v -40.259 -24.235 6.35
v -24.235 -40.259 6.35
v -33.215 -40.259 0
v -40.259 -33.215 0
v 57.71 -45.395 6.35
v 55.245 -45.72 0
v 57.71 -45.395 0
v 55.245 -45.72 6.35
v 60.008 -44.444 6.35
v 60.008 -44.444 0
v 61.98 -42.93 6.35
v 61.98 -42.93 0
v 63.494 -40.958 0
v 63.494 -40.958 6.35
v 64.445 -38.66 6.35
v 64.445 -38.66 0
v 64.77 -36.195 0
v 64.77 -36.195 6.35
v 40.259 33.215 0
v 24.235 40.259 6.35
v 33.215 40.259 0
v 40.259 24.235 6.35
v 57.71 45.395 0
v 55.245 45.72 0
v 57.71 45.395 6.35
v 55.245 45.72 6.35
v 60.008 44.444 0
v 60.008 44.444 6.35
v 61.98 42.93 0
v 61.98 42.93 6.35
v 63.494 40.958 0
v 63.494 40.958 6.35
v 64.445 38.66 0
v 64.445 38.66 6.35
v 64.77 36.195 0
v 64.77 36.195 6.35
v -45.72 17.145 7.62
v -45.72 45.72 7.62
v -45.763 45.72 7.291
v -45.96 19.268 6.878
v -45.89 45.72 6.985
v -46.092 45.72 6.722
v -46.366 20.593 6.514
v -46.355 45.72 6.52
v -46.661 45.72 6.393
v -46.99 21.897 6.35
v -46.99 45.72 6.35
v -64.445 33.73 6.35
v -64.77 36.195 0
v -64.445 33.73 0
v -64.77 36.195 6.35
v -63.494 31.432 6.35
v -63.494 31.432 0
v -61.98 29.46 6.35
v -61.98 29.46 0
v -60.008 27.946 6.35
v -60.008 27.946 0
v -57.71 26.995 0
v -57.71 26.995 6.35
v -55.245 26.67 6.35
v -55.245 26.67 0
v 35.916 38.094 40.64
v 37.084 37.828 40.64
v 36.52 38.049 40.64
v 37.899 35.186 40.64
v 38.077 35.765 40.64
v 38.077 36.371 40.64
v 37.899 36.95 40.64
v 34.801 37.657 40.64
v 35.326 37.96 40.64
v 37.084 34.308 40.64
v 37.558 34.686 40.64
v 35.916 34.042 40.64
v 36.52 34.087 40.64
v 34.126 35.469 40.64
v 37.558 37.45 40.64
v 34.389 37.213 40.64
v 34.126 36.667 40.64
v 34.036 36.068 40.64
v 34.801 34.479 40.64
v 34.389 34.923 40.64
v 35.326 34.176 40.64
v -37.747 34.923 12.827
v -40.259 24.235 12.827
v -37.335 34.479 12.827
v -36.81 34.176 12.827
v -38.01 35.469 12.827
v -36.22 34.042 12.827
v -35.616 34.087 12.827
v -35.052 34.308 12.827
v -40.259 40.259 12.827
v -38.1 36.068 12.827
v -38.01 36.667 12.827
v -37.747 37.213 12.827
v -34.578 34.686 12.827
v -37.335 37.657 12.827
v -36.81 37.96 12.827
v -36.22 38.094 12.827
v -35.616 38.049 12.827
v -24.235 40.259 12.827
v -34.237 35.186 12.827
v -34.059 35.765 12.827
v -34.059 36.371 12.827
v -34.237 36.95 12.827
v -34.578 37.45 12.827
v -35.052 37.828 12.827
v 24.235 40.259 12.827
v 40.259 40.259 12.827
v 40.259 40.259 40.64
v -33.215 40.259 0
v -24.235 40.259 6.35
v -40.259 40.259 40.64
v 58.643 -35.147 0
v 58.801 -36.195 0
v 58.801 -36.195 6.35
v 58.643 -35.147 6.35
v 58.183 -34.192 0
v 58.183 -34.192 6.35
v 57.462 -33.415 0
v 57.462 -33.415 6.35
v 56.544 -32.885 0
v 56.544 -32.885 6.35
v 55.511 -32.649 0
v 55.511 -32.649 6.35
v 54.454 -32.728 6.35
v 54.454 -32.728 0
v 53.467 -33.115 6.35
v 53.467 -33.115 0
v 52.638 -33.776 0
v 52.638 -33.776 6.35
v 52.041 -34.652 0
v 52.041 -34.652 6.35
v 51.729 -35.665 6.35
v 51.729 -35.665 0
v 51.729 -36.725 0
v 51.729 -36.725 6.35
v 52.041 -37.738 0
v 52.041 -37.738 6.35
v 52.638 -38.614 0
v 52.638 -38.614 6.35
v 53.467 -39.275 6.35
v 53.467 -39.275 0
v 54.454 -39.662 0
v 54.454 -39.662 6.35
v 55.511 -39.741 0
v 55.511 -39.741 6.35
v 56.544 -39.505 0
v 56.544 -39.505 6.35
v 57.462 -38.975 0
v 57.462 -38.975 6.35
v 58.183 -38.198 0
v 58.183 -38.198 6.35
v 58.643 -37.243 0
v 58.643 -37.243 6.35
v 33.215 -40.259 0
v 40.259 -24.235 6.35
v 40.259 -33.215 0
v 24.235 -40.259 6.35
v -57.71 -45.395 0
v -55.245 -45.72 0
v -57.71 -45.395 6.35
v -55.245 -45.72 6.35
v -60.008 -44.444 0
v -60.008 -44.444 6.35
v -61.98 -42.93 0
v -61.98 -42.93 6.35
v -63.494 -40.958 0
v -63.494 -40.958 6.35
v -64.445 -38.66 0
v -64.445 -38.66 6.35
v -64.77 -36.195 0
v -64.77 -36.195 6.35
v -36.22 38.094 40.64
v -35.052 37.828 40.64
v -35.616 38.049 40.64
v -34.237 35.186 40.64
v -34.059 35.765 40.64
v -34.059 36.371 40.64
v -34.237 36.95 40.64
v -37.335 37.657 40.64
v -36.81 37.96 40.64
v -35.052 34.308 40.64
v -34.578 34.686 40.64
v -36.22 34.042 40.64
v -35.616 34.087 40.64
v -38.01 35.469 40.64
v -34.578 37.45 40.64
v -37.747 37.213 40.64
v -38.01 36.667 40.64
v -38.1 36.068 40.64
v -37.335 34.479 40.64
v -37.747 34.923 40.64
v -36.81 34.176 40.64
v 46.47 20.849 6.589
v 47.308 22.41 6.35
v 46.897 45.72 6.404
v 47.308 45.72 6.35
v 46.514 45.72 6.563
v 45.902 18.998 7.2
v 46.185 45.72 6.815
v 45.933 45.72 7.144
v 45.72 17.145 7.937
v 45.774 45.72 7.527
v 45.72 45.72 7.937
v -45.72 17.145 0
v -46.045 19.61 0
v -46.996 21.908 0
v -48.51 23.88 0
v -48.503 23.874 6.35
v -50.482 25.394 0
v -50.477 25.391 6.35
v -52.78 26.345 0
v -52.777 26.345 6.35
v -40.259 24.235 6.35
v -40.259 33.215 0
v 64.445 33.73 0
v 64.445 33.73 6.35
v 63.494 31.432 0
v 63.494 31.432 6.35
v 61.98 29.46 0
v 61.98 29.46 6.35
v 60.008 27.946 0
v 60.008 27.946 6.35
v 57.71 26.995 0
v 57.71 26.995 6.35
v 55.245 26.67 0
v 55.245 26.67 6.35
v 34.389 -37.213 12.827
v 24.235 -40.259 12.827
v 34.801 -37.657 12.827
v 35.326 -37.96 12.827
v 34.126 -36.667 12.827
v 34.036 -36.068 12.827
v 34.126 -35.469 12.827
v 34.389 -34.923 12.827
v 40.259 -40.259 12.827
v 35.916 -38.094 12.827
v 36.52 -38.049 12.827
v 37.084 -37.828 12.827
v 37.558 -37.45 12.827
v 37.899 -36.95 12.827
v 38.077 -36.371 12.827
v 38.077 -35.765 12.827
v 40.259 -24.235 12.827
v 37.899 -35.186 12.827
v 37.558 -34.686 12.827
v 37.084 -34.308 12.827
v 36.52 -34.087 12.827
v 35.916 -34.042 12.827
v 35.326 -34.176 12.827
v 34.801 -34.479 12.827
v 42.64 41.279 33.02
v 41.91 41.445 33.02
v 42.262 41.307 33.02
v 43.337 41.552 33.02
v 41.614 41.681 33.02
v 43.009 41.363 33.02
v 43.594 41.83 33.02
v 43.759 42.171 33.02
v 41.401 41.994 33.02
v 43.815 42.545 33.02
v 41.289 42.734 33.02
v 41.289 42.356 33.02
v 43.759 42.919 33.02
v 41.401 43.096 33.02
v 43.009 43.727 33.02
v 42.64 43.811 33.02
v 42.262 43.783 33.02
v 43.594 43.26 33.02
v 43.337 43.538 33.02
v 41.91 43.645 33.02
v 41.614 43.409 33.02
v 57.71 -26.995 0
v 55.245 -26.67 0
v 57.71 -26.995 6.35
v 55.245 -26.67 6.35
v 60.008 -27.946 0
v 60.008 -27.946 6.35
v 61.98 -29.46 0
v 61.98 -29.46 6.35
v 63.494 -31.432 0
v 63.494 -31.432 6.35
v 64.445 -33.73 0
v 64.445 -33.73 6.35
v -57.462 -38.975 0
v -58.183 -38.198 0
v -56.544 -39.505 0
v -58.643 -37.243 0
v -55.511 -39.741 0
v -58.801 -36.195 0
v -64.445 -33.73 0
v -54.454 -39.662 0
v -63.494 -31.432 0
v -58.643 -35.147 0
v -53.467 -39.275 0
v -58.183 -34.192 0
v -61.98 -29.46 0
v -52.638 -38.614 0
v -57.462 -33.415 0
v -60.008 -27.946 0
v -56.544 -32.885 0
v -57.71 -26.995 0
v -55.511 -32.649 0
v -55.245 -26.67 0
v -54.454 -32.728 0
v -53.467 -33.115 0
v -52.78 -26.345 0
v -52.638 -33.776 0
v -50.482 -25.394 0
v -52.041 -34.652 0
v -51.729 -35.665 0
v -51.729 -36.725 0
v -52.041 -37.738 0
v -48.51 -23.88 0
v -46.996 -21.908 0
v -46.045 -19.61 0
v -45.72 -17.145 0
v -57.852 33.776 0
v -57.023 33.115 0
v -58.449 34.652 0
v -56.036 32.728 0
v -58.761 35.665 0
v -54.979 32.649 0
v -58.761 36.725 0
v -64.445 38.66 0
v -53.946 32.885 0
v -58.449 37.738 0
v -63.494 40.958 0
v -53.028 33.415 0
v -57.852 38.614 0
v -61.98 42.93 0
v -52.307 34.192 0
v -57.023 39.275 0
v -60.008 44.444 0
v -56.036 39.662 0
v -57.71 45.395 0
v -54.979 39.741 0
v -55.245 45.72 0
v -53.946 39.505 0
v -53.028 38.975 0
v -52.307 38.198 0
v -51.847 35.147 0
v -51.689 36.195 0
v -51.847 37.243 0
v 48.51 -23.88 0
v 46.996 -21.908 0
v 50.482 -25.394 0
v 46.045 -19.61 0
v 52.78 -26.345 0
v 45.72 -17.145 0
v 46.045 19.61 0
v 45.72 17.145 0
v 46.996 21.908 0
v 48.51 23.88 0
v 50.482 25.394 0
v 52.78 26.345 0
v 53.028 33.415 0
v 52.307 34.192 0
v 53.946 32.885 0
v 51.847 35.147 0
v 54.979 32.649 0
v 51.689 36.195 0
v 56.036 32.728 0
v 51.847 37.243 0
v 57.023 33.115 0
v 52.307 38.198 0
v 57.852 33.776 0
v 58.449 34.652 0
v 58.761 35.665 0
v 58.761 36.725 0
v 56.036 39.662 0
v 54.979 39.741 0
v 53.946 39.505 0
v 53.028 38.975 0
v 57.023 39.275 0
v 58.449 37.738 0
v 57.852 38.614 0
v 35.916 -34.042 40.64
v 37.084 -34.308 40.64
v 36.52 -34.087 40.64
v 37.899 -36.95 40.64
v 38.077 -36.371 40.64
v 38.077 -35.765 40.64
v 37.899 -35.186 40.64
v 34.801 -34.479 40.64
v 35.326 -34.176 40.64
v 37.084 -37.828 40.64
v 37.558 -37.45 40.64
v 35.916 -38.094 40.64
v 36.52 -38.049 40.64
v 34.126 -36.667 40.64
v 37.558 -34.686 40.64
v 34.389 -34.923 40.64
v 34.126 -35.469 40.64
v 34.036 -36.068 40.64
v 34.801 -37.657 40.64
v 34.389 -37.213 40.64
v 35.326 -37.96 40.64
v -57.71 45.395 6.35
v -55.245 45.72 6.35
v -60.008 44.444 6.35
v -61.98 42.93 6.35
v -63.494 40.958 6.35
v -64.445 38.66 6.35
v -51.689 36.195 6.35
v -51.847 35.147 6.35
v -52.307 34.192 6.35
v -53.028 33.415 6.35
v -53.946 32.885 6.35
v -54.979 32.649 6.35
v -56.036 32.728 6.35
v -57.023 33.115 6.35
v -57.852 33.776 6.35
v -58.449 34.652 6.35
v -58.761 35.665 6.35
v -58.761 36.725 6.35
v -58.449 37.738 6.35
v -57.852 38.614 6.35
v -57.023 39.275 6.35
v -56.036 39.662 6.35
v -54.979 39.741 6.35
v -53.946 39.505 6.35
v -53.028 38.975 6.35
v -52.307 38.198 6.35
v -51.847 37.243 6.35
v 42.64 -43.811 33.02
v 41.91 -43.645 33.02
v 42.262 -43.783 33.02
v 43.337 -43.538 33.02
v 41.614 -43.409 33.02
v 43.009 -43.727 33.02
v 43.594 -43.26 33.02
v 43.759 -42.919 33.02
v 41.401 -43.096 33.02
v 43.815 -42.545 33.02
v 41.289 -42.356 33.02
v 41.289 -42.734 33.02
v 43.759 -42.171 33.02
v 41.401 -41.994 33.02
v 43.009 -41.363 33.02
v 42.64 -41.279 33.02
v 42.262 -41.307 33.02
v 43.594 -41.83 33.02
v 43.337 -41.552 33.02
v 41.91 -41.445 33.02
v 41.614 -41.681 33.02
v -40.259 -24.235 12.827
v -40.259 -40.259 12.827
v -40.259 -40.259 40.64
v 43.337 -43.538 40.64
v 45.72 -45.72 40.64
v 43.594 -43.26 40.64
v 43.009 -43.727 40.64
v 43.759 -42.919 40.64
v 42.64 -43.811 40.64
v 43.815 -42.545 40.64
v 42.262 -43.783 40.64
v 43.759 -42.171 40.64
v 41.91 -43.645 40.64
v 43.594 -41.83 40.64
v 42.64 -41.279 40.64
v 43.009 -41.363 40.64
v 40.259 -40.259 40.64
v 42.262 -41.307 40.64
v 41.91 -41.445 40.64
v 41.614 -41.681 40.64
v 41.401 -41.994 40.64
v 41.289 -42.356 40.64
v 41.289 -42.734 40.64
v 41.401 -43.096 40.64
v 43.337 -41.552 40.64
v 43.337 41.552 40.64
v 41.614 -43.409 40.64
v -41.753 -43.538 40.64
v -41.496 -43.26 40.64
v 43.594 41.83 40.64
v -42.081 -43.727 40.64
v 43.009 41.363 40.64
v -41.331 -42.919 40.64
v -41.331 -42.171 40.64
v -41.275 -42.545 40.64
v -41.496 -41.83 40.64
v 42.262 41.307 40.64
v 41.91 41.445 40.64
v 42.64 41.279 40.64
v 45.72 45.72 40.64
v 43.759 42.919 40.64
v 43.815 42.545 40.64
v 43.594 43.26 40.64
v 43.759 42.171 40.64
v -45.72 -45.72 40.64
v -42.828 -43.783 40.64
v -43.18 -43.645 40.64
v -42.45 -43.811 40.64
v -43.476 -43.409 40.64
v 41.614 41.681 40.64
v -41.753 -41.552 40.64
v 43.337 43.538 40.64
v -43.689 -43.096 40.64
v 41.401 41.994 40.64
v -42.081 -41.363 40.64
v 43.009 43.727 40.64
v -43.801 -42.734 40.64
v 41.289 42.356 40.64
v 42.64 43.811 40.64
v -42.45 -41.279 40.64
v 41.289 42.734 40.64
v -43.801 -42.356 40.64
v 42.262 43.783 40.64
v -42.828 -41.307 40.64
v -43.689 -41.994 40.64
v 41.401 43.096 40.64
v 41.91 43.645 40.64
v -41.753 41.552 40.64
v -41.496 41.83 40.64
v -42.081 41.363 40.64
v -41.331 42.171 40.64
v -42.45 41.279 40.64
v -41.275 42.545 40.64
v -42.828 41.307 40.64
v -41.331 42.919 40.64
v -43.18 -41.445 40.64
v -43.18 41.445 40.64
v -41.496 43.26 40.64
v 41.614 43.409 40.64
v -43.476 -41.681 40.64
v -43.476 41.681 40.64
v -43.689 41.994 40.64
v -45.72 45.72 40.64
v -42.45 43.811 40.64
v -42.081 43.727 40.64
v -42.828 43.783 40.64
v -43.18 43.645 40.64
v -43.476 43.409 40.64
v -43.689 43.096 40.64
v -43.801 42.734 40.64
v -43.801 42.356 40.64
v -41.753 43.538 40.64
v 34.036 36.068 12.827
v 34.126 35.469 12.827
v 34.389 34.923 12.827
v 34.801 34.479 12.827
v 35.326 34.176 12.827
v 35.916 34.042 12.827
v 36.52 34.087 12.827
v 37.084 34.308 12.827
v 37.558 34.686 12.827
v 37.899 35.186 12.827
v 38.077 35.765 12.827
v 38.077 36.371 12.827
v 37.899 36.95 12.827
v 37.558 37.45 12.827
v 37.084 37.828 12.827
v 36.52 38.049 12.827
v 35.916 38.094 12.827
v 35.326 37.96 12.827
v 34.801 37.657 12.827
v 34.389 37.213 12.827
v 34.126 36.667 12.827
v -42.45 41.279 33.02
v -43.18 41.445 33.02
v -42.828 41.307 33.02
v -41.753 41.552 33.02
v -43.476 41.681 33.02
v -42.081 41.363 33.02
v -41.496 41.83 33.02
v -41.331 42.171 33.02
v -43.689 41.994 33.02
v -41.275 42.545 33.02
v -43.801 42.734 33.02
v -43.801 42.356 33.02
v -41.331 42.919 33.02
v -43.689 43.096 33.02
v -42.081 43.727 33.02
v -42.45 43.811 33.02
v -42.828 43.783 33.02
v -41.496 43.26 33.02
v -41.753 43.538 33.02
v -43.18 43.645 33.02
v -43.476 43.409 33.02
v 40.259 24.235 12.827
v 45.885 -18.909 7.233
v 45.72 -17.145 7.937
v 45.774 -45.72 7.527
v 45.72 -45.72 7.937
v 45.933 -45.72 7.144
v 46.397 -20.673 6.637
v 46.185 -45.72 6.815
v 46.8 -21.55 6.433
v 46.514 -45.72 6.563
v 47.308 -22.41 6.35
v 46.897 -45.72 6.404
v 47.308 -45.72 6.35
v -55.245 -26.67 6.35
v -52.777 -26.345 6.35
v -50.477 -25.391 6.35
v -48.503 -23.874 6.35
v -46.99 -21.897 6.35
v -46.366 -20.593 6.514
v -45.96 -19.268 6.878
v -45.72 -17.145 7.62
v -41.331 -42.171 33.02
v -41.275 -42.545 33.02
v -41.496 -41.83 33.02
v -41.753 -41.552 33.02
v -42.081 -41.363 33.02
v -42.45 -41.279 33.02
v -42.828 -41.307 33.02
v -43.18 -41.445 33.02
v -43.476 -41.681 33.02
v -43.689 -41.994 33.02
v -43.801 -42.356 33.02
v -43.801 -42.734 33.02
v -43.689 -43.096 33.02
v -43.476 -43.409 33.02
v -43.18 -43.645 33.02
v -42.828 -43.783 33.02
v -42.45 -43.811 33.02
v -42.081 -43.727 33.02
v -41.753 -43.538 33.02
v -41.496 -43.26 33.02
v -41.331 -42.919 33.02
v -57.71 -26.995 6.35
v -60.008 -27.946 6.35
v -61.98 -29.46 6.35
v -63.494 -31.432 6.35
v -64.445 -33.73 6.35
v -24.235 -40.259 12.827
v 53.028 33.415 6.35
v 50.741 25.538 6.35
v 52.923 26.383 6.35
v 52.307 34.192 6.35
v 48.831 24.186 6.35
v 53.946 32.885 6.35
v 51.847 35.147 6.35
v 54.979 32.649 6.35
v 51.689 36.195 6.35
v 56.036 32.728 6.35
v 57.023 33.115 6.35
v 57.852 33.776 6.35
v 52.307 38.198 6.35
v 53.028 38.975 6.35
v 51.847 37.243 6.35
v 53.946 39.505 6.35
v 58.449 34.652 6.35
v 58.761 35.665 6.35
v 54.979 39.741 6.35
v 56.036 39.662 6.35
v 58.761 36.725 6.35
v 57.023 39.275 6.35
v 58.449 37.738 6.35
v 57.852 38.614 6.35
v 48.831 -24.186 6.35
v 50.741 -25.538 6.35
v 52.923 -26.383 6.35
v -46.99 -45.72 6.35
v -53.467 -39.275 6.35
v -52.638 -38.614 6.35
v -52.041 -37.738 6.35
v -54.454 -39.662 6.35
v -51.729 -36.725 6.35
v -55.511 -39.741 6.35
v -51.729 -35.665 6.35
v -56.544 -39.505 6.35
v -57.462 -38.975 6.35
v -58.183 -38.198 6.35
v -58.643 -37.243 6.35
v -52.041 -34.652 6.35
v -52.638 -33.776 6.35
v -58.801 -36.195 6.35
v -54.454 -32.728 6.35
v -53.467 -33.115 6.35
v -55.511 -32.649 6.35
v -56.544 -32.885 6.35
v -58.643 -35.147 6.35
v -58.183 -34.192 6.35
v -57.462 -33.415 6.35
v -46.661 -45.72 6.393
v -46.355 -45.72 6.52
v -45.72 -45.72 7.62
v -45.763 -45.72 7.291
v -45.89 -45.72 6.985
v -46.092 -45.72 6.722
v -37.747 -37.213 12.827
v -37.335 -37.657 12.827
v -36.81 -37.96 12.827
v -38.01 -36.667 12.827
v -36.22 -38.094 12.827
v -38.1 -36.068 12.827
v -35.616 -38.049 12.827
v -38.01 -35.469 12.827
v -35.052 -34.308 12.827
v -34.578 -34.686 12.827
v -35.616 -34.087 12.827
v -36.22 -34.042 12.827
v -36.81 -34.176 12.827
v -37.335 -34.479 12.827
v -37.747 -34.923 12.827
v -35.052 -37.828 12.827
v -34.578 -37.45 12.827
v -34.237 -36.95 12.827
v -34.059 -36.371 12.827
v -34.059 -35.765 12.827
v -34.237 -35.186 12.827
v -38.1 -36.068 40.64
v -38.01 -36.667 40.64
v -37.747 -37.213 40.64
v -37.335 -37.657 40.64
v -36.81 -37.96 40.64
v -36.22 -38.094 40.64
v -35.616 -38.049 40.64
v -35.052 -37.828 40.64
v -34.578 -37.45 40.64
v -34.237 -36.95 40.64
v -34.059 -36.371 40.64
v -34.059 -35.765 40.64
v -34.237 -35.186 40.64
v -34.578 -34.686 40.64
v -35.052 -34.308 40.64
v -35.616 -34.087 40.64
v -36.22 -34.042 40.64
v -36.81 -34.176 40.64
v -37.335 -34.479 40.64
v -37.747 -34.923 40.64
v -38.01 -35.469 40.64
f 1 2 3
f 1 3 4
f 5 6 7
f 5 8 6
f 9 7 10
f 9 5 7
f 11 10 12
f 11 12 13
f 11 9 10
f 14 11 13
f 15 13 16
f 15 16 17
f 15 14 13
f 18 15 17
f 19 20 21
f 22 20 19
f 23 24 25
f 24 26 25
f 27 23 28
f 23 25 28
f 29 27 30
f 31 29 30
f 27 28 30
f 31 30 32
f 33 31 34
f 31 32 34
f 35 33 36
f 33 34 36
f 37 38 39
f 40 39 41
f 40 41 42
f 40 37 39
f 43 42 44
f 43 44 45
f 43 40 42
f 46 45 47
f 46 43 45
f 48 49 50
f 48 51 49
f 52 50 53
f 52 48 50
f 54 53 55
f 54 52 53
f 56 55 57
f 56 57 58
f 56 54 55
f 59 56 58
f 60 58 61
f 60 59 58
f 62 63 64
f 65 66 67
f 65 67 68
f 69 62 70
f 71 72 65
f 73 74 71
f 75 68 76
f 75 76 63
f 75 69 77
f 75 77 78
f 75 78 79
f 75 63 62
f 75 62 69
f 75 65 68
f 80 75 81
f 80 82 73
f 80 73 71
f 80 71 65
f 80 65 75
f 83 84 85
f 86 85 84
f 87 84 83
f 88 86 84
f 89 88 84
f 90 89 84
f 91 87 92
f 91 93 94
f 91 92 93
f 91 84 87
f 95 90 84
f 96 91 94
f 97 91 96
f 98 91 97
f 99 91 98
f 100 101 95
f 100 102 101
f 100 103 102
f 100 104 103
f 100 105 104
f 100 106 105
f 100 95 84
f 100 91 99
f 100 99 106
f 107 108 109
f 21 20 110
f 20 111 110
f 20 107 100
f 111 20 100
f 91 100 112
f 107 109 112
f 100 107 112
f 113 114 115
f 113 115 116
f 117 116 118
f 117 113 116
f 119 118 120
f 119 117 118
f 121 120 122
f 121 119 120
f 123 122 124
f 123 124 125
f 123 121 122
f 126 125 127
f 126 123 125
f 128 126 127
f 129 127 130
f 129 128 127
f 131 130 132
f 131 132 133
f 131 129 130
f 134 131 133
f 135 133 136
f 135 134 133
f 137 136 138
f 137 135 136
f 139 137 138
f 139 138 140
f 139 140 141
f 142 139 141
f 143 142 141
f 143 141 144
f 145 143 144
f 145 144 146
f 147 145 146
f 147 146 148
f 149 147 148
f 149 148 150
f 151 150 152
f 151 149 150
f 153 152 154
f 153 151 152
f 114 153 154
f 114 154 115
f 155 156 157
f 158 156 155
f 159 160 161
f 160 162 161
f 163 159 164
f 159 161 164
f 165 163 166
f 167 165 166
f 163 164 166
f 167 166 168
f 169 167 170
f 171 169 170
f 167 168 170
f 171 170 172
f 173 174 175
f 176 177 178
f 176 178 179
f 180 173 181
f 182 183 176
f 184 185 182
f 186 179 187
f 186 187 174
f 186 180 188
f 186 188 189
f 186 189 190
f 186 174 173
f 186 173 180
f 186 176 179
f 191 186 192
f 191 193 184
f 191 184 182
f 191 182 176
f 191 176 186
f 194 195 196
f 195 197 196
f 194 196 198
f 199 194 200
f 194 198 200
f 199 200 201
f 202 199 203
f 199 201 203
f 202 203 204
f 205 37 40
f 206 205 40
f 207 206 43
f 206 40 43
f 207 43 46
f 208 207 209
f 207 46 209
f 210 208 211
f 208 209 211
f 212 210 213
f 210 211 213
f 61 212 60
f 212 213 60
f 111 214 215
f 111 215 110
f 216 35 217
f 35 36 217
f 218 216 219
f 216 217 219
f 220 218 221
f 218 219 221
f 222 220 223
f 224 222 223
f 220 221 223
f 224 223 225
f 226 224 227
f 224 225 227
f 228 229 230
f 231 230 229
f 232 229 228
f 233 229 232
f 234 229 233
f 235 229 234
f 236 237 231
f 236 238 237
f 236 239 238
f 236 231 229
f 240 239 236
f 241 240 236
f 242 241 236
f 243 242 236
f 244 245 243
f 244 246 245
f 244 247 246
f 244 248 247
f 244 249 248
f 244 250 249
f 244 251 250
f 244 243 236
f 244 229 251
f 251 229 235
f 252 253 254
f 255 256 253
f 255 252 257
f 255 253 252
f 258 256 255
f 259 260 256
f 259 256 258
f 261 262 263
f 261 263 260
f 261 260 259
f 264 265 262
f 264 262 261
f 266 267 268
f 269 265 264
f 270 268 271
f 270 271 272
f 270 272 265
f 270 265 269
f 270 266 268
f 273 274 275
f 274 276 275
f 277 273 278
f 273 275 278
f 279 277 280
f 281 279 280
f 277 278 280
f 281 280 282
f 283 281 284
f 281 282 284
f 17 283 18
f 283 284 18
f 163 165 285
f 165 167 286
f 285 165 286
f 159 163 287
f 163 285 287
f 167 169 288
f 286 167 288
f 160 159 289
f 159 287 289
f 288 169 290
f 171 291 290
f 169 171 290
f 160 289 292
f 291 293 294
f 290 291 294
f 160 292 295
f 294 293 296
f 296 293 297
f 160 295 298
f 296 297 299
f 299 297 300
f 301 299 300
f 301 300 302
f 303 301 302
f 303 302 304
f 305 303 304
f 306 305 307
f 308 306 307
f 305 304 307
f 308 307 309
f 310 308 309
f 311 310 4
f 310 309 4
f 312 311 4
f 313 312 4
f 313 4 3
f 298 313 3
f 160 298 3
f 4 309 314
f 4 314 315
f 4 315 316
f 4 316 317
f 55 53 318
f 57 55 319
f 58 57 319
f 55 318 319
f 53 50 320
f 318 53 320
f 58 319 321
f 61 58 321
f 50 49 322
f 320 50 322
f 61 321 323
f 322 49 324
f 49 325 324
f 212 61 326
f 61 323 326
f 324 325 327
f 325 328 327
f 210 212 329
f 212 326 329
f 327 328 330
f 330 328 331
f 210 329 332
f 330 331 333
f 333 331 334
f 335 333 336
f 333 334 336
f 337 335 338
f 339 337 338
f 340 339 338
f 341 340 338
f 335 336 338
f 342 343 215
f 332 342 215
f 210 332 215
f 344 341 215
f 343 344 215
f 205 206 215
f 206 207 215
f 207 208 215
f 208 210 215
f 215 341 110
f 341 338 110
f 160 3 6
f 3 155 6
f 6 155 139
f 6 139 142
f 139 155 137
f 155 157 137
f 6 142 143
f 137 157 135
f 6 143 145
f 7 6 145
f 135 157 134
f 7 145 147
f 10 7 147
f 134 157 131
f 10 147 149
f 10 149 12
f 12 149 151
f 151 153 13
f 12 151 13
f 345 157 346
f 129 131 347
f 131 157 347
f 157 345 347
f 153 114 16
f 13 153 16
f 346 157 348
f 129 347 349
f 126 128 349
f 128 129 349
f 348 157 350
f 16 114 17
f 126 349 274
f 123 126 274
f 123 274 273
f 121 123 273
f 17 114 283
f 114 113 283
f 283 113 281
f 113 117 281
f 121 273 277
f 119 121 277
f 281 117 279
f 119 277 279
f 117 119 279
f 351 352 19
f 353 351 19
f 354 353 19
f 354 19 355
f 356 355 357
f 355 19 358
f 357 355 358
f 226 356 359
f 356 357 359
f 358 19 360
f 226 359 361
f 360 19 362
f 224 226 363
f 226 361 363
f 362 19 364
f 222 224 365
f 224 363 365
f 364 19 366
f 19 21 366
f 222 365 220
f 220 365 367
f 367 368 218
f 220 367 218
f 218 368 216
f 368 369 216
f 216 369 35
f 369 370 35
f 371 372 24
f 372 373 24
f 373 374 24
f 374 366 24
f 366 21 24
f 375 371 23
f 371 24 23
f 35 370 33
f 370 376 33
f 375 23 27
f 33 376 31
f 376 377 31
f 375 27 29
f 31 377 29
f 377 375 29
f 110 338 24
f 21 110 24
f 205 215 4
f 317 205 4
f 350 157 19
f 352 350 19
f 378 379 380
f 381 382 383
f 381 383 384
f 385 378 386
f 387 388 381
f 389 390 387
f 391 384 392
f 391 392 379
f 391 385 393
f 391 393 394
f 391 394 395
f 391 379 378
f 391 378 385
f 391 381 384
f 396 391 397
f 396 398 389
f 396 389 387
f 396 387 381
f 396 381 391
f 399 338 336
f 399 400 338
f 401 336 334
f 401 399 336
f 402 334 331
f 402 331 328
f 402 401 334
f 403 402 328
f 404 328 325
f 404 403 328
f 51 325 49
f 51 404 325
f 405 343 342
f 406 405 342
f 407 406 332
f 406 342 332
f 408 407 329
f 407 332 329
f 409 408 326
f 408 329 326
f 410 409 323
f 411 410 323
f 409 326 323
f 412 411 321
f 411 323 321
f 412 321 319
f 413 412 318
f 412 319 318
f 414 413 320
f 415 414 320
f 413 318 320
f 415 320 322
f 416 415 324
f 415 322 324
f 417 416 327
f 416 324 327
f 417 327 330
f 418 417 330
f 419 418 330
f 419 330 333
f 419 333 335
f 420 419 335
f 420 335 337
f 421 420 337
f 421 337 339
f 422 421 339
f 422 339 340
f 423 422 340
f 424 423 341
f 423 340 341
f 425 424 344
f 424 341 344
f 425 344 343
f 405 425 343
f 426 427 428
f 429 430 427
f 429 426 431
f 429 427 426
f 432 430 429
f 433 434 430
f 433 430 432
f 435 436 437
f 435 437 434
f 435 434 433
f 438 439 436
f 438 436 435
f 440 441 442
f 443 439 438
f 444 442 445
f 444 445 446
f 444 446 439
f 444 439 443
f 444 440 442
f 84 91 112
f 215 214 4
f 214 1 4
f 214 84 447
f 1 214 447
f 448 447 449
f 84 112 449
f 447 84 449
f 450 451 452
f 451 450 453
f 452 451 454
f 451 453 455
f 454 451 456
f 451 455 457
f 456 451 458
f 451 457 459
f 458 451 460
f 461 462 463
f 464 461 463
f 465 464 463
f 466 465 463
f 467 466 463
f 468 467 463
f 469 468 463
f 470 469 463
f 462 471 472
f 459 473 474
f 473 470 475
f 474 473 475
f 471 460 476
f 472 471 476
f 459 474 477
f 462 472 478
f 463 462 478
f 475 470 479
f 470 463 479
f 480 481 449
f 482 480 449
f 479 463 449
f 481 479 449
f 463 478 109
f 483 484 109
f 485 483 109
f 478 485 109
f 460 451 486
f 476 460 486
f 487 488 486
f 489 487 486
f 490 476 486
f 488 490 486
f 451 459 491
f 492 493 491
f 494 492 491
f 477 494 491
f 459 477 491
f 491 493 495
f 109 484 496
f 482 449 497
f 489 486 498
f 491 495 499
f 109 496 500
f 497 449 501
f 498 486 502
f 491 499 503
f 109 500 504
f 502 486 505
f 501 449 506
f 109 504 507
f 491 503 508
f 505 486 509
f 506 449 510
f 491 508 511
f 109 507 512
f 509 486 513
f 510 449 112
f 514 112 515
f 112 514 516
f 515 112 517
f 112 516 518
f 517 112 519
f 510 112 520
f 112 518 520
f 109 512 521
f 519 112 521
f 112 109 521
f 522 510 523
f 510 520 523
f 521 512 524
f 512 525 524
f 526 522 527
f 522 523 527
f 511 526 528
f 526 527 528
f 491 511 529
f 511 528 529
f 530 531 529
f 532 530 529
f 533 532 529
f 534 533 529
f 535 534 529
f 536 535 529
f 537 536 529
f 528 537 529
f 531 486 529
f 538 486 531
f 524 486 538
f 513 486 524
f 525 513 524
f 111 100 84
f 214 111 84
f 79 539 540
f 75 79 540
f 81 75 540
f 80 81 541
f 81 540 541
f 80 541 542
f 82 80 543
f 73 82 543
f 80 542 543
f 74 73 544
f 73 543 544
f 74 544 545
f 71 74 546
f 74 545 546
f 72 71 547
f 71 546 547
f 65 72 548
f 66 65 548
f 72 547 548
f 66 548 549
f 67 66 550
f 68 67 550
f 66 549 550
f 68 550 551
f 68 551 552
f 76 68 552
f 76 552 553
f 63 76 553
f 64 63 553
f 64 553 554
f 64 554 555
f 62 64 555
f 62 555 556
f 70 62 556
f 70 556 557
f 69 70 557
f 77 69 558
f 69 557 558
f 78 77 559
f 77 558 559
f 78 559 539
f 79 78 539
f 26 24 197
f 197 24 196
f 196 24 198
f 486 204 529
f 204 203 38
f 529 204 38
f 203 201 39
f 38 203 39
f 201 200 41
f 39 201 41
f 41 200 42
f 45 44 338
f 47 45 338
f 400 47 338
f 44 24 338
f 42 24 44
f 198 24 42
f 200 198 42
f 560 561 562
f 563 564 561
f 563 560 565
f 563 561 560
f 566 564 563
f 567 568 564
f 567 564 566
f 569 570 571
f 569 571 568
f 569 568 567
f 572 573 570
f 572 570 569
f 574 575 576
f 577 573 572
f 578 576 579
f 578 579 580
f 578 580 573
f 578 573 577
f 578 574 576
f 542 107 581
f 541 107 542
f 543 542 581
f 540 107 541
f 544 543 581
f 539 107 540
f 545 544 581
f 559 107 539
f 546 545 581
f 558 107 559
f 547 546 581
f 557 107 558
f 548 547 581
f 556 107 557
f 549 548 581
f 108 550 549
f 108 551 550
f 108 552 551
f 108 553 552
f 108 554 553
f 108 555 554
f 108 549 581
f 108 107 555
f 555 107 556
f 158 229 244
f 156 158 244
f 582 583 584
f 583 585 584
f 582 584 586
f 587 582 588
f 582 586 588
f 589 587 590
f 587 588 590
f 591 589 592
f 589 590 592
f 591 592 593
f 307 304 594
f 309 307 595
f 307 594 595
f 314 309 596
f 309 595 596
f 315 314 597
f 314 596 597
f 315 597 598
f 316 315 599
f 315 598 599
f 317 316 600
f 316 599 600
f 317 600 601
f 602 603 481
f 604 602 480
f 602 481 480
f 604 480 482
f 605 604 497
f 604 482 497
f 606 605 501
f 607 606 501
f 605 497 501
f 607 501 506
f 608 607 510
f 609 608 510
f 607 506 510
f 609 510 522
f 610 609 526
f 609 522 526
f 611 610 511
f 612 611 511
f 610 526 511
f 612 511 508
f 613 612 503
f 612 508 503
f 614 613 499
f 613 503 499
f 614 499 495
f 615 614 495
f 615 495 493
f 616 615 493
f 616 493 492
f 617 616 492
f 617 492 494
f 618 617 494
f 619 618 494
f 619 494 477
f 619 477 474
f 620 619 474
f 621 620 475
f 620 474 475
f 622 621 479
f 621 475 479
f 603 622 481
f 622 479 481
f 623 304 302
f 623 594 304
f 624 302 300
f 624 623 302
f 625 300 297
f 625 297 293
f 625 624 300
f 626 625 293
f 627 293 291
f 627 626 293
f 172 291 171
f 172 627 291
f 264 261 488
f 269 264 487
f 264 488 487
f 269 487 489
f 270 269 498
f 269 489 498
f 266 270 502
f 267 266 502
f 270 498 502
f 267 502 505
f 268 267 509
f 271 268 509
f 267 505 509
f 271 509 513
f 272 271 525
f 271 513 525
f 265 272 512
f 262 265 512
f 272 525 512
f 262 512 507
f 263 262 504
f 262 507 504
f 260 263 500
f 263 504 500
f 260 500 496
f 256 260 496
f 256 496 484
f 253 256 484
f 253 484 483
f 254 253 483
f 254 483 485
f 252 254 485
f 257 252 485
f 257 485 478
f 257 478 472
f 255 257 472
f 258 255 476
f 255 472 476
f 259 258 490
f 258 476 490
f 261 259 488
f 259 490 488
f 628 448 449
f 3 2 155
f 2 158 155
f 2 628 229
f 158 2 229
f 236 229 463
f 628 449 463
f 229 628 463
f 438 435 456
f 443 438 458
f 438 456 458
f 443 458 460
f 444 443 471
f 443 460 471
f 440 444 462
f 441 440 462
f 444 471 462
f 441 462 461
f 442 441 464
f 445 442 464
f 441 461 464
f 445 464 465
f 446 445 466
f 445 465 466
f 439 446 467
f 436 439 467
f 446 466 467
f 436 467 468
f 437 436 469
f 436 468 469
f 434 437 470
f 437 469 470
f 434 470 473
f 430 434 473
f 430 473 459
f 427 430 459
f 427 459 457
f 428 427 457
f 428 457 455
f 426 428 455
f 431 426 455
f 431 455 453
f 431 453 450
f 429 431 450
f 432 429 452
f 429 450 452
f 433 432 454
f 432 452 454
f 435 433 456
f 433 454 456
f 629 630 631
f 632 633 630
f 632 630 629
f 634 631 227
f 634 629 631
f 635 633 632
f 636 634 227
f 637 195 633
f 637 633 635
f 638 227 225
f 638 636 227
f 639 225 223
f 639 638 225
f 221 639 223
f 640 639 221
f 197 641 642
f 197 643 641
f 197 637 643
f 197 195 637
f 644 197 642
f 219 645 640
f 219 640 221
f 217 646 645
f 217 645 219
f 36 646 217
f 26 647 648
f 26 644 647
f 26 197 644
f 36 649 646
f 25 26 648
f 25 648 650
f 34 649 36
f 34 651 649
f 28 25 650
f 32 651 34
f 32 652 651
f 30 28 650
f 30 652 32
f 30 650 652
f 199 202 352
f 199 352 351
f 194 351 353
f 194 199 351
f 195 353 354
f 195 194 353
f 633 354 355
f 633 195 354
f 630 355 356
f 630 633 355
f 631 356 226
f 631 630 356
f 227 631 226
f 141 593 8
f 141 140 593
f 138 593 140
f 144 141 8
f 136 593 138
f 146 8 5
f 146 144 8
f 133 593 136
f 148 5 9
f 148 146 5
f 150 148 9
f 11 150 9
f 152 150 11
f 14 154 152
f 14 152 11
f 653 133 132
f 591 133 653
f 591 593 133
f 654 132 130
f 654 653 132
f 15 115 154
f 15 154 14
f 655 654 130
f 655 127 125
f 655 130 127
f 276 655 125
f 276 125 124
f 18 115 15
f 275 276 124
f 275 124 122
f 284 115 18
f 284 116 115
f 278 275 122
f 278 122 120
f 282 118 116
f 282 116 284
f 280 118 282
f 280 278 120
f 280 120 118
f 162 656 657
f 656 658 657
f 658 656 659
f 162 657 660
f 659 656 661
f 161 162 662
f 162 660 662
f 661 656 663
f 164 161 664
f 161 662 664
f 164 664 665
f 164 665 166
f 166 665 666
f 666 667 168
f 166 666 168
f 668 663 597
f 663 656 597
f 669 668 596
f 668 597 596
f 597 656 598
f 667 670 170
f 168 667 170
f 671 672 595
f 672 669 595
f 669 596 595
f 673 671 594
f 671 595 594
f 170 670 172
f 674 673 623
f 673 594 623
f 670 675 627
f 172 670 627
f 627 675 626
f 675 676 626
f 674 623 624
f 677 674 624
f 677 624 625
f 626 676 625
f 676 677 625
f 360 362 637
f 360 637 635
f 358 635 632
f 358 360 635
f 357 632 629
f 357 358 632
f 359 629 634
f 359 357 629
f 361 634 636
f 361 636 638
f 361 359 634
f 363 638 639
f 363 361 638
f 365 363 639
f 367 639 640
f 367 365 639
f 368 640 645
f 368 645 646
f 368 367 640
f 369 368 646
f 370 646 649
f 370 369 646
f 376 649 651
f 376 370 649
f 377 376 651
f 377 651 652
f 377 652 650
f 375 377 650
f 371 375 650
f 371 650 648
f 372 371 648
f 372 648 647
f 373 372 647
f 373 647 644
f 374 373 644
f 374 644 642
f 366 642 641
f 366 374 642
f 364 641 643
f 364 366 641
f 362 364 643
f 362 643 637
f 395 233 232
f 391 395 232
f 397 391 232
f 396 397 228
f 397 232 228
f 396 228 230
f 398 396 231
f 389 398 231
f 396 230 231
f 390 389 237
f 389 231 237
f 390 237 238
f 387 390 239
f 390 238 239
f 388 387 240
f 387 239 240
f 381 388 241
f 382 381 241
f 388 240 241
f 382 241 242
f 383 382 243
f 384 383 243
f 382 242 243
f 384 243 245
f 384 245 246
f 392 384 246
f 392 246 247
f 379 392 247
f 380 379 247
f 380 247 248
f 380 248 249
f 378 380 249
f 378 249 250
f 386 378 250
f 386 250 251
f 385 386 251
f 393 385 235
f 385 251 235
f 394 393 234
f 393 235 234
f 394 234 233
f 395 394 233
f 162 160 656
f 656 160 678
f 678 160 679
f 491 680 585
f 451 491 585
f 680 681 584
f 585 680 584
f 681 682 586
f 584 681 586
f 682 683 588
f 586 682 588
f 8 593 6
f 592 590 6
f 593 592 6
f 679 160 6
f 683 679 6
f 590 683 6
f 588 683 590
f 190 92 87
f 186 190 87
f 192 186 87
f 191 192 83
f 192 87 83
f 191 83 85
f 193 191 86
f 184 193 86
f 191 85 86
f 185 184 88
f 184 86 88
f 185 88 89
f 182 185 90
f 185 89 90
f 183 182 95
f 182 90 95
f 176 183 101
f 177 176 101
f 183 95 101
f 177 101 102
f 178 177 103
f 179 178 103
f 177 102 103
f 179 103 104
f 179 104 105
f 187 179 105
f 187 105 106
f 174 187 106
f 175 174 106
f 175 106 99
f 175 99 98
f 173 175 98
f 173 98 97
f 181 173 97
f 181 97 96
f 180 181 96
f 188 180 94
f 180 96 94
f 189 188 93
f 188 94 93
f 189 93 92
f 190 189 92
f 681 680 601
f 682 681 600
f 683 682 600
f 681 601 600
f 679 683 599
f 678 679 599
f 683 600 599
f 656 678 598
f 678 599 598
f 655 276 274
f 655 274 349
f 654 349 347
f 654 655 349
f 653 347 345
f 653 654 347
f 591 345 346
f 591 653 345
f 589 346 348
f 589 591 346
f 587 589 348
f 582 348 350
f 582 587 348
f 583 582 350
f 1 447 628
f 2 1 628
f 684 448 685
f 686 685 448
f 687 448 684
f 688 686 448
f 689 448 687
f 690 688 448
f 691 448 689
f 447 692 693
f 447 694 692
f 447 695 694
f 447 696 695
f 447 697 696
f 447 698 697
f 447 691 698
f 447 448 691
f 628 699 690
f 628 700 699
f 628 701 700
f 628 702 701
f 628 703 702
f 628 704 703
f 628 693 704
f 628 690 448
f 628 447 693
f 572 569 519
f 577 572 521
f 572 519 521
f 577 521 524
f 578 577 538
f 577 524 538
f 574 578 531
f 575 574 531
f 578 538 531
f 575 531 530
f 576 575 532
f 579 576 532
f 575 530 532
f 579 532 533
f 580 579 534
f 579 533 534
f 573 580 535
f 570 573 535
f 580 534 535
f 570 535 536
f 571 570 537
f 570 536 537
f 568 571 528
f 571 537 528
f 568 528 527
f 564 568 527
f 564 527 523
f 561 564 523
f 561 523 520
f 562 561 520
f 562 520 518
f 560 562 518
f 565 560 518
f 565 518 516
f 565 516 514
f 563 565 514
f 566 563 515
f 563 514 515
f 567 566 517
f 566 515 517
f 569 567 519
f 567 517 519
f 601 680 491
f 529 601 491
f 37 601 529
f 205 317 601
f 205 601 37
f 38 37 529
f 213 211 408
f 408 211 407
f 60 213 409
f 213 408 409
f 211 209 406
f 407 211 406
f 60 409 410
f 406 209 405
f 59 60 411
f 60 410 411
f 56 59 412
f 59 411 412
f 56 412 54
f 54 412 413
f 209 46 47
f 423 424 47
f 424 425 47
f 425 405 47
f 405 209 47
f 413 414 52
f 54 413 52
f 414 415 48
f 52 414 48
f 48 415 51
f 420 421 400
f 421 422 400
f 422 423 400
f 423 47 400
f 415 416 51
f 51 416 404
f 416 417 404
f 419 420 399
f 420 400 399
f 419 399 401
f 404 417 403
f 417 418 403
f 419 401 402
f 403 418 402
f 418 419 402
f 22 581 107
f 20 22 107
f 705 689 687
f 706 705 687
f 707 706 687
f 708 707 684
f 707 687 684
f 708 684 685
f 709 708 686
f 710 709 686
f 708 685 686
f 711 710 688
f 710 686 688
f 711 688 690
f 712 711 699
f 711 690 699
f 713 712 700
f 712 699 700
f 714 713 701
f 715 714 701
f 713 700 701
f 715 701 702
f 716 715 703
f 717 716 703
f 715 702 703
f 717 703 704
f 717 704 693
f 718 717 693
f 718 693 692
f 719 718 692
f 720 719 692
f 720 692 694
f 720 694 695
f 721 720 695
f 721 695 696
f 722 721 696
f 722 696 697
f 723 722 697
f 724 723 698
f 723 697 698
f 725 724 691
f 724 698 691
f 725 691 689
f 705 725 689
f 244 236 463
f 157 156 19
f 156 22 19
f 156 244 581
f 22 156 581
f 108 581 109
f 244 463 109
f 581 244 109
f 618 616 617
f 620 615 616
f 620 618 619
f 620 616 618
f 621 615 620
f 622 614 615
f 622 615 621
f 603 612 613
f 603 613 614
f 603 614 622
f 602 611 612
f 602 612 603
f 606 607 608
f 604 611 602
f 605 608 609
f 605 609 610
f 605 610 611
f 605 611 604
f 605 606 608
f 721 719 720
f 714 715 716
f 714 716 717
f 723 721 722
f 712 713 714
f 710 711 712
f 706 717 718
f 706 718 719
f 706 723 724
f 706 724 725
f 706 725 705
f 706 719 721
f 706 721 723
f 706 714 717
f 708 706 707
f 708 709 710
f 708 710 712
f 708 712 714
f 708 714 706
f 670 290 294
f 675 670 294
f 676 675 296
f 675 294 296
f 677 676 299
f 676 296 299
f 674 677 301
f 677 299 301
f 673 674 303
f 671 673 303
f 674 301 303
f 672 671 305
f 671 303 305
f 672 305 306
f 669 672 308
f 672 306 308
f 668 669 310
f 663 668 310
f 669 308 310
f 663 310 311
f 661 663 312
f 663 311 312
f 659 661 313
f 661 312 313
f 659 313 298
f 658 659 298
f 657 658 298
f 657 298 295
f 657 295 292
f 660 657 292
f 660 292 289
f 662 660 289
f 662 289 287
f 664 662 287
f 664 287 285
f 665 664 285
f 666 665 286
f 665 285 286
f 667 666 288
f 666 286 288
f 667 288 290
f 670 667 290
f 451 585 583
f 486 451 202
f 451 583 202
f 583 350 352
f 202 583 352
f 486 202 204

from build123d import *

# Parameters (mm, degrees)
SKETCH1_W           = 80.01
SKETCH1_H           = 80.01
BOSS_EXTRUDE1_DEPTH = 12.827
SKETCH2_R           = 2.032
BOSS_EXTRUDE2_DEPTH = 27.813
SKETCH3_W           = 91.44
SKETCH3_H           = 91.44
SKETCH3_W_2         = 80.01
SKETCH3_H_2         = 80.01
BOSS_EXTRUDE3_DEPTH = 40.64
CUT_EXTRUDE1_DEPTH  = 71.386076528
SKETCH6_W           = 80.518
SKETCH6_H           = 80.518
SKETCH6_W_2         = 80.01
SKETCH6_H_2         = 80.01
CUT_EXTRUDE2_DEPTH  = 27.813
CUT_EXTRUDE3_DEPTH  = 71.386076528
SKETCH9_W           = 19.05
SKETCH9_H           = 19.05
SKETCH9_R           = 3.556
BOSS_EXTRUDE4_DEPTH = 6.35
FILLET1_R           = 9.525
FILLET2_R           = 1.27
FILLET3_R           = 9.525
FILLET4_R           = 1.5875
SKETCH10_R          = 1.27
CUT_EXTRUDE4_DEPTH  = 7.62
CHAMFER2_SIZE       = 6.35


with BuildPart() as part:
    # Sketch1 → Boss-Extrude1 (new body)
    with BuildSketch(Plane.XY):
        Rectangle(SKETCH1_W, SKETCH1_H)
    extrude(amount=BOSS_EXTRUDE1_DEPTH)

    # Sketch2 → Boss-Extrude2 (add)
    with BuildSketch(Plane.XY.offset(12.827)):
        with Locations(Location((-36.068, 36.068, 0), (0, 0, 180))):
            Circle(SKETCH2_R)
        with Locations(Location((36.068, 36.068, 0), (0, 0, 180))):
            Circle(SKETCH2_R)
        with Locations(Location((36.068, -36.068, 0), (0, 0, 180))):
            Circle(SKETCH2_R)
        with Locations(Location((-36.068, -36.068, 0), (0, 0, 180))):
            Circle(SKETCH2_R)
    extrude(amount=BOSS_EXTRUDE2_DEPTH)

    # Sketch3 → Boss-Extrude3 (add, through all)
    with BuildSketch(Plane(origin=(0, 0, 0), x_dir=(-1, 0, 0), z_dir=(0, 0, -1))):
        Rectangle(SKETCH3_W, SKETCH3_H)
        Rectangle(SKETCH3_W_2, SKETCH3_H_2, mode=Mode.SUBTRACT)
    extrude(amount=-BOSS_EXTRUDE3_DEPTH)

    # Sketch4 → Cut-Extrude1 (cut, through all)
    with BuildSketch(Plane.XY.offset(12.827)):
        Polygon((24.13, 40.005), (40.005, 24.13), (40.005, -24.13), (24.13, -40.005), (-24.13, -40.005), (-40.005, -24.13), (-40.005, 24.13), (-24.13, 40.005), align=None)
    extrude(amount=-CUT_EXTRUDE1_DEPTH, mode=Mode.SUBTRACT)

    # Sketch6 → Cut-Extrude2 (cut)
    with BuildSketch(Plane.XY.offset(40.64)):
        Rectangle(SKETCH6_W, SKETCH6_H)
        Rectangle(SKETCH6_W_2, SKETCH6_H_2, mode=Mode.SUBTRACT)
    extrude(amount=-CUT_EXTRUDE2_DEPTH, mode=Mode.SUBTRACT)

    # Sketch7 → Cut-Extrude3 (cut, through all)
    with BuildSketch(Plane.XY.offset(12.827)):
        Polygon((-40.259, 24.235210245), (-40.259, -24.235210245), (-24.235210245, -40.259), (24.235210245, -40.259), (40.259, -24.235210245), (40.259, 24.235210245), (24.235210245, 40.259), (-24.235210245, 40.259), align=None)
        Polygon((-40.005, 24.13), (-40.005, -24.13), (-24.13, -40.005), (24.13, -40.005), (40.005, -24.13), (40.005, 24.13), (24.13, 40.005), (-24.13, 40.005), align=None, mode=Mode.SUBTRACT)
    extrude(amount=-CUT_EXTRUDE3_DEPTH, mode=Mode.SUBTRACT)

    # Sketch9 → Boss-Extrude4 (add)
    # profile 1 of 2: a face of its own
    with BuildSketch(Plane(origin=(0, 0, 0), x_dir=(-1, 0, 0), z_dir=(0, 0, -1))):
        with Locations((55.245, -36.195)):
            Rectangle(SKETCH9_W, SKETCH9_H)
        with Locations((55.245, -36.195)):
            Circle(SKETCH9_R, mode=Mode.SUBTRACT)
    # profile 2 of 2: a face of its own
    with BuildSketch(Plane(origin=(0, 0, 0), x_dir=(-1, 0, 0), z_dir=(0, 0, -1))):
        with Locations((55.245, 36.195)):
            Rectangle(SKETCH9_W, SKETCH9_H)
        with Locations(Location((55.245, 36.195, 0), (0, 0, 180))):
            Circle(SKETCH9_R, mode=Mode.SUBTRACT)
    boss_extrude4 = extrude(amount=-BOSS_EXTRUDE4_DEPTH)

    # Fillet1
    fillet1_edges = [part.edges().sort_by_distance(p)[0] for p in [
        (-45.72, 26.67, 3.175),
        (-45.72, -26.67, 3.175),
        (-64.77, -45.72, 3.175),
        (-64.77, -26.67, 3.175),
        (-64.77, 26.67, 3.175),
        (-64.77, 45.72, 3.175),
    ]]
    fillet(fillet1_edges, radius=FILLET1_R - 0.0001)  # a hair under: the kernel refuses the full size

    # Fillet2
    fillet2_edges = [part.edges().sort_by_distance(p)[0] for p in [
        (-45.72, -31.43255, 6.35),
        (-45.72, 31.43255, 6.35),
    ]]
    fillet(fillet2_edges, radius=FILLET2_R)

    # Mirror4: Boss-Extrude4 across plane
    add(boss_extrude4.mirror(Plane(origin=(0, 0, 0), x_dir=(0, 0, 1), z_dir=(1, 0, 0))))

    # Fillet3
    fillet3_edges = [part.edges().sort_by_distance(p)[0] for p in [
        (45.72, -26.67, 3.175),
        (64.77, -26.67, 3.175),
        (64.77, -45.72, 3.175),
        (45.72, 26.67, 3.175),
        (64.77, 26.67, 3.175),
        (64.77, 45.72, 3.175),
    ]]
    fillet(fillet3_edges, radius=FILLET3_R - 0.0001)  # a hair under: the kernel refuses the full size

    # Fillet4
    fillet4_edges = [part.edges().sort_by_distance(p)[0] for p in [
        (45.72, -31.43255, 6.35),
        (45.72, 31.43255, 6.35),
    ]]
    fillet(fillet4_edges, radius=FILLET4_R)

    # Sketch10 → Cut-Extrude4 (cut)
    with BuildSketch(Plane.XY.offset(40.64)):
        with Locations((-42.545, 42.545)):
            Circle(SKETCH10_R)
        with Locations((42.545, 42.545)):
            Circle(SKETCH10_R)
        with Locations((42.545, -42.545)):
            Circle(SKETCH10_R)
        with Locations((-42.545, -42.545)):
            Circle(SKETCH10_R)
    extrude(amount=-CUT_EXTRUDE4_DEPTH, mode=Mode.SUBTRACT)

    # Chamfer2
    chamfer2_edges = [part.edges().sort_by_distance(p)[0] for p in [
        (-32.247105122, 32.247105122, 0),
        (32.247105122, 32.247105122, 0),
        (32.247105122, -32.247105122, 0),
        (-32.247105122, -32.247105122, 0),
    ]]
    chamfer(chamfer2_edges, length=CHAMFER2_SIZE)


solid = part.part
